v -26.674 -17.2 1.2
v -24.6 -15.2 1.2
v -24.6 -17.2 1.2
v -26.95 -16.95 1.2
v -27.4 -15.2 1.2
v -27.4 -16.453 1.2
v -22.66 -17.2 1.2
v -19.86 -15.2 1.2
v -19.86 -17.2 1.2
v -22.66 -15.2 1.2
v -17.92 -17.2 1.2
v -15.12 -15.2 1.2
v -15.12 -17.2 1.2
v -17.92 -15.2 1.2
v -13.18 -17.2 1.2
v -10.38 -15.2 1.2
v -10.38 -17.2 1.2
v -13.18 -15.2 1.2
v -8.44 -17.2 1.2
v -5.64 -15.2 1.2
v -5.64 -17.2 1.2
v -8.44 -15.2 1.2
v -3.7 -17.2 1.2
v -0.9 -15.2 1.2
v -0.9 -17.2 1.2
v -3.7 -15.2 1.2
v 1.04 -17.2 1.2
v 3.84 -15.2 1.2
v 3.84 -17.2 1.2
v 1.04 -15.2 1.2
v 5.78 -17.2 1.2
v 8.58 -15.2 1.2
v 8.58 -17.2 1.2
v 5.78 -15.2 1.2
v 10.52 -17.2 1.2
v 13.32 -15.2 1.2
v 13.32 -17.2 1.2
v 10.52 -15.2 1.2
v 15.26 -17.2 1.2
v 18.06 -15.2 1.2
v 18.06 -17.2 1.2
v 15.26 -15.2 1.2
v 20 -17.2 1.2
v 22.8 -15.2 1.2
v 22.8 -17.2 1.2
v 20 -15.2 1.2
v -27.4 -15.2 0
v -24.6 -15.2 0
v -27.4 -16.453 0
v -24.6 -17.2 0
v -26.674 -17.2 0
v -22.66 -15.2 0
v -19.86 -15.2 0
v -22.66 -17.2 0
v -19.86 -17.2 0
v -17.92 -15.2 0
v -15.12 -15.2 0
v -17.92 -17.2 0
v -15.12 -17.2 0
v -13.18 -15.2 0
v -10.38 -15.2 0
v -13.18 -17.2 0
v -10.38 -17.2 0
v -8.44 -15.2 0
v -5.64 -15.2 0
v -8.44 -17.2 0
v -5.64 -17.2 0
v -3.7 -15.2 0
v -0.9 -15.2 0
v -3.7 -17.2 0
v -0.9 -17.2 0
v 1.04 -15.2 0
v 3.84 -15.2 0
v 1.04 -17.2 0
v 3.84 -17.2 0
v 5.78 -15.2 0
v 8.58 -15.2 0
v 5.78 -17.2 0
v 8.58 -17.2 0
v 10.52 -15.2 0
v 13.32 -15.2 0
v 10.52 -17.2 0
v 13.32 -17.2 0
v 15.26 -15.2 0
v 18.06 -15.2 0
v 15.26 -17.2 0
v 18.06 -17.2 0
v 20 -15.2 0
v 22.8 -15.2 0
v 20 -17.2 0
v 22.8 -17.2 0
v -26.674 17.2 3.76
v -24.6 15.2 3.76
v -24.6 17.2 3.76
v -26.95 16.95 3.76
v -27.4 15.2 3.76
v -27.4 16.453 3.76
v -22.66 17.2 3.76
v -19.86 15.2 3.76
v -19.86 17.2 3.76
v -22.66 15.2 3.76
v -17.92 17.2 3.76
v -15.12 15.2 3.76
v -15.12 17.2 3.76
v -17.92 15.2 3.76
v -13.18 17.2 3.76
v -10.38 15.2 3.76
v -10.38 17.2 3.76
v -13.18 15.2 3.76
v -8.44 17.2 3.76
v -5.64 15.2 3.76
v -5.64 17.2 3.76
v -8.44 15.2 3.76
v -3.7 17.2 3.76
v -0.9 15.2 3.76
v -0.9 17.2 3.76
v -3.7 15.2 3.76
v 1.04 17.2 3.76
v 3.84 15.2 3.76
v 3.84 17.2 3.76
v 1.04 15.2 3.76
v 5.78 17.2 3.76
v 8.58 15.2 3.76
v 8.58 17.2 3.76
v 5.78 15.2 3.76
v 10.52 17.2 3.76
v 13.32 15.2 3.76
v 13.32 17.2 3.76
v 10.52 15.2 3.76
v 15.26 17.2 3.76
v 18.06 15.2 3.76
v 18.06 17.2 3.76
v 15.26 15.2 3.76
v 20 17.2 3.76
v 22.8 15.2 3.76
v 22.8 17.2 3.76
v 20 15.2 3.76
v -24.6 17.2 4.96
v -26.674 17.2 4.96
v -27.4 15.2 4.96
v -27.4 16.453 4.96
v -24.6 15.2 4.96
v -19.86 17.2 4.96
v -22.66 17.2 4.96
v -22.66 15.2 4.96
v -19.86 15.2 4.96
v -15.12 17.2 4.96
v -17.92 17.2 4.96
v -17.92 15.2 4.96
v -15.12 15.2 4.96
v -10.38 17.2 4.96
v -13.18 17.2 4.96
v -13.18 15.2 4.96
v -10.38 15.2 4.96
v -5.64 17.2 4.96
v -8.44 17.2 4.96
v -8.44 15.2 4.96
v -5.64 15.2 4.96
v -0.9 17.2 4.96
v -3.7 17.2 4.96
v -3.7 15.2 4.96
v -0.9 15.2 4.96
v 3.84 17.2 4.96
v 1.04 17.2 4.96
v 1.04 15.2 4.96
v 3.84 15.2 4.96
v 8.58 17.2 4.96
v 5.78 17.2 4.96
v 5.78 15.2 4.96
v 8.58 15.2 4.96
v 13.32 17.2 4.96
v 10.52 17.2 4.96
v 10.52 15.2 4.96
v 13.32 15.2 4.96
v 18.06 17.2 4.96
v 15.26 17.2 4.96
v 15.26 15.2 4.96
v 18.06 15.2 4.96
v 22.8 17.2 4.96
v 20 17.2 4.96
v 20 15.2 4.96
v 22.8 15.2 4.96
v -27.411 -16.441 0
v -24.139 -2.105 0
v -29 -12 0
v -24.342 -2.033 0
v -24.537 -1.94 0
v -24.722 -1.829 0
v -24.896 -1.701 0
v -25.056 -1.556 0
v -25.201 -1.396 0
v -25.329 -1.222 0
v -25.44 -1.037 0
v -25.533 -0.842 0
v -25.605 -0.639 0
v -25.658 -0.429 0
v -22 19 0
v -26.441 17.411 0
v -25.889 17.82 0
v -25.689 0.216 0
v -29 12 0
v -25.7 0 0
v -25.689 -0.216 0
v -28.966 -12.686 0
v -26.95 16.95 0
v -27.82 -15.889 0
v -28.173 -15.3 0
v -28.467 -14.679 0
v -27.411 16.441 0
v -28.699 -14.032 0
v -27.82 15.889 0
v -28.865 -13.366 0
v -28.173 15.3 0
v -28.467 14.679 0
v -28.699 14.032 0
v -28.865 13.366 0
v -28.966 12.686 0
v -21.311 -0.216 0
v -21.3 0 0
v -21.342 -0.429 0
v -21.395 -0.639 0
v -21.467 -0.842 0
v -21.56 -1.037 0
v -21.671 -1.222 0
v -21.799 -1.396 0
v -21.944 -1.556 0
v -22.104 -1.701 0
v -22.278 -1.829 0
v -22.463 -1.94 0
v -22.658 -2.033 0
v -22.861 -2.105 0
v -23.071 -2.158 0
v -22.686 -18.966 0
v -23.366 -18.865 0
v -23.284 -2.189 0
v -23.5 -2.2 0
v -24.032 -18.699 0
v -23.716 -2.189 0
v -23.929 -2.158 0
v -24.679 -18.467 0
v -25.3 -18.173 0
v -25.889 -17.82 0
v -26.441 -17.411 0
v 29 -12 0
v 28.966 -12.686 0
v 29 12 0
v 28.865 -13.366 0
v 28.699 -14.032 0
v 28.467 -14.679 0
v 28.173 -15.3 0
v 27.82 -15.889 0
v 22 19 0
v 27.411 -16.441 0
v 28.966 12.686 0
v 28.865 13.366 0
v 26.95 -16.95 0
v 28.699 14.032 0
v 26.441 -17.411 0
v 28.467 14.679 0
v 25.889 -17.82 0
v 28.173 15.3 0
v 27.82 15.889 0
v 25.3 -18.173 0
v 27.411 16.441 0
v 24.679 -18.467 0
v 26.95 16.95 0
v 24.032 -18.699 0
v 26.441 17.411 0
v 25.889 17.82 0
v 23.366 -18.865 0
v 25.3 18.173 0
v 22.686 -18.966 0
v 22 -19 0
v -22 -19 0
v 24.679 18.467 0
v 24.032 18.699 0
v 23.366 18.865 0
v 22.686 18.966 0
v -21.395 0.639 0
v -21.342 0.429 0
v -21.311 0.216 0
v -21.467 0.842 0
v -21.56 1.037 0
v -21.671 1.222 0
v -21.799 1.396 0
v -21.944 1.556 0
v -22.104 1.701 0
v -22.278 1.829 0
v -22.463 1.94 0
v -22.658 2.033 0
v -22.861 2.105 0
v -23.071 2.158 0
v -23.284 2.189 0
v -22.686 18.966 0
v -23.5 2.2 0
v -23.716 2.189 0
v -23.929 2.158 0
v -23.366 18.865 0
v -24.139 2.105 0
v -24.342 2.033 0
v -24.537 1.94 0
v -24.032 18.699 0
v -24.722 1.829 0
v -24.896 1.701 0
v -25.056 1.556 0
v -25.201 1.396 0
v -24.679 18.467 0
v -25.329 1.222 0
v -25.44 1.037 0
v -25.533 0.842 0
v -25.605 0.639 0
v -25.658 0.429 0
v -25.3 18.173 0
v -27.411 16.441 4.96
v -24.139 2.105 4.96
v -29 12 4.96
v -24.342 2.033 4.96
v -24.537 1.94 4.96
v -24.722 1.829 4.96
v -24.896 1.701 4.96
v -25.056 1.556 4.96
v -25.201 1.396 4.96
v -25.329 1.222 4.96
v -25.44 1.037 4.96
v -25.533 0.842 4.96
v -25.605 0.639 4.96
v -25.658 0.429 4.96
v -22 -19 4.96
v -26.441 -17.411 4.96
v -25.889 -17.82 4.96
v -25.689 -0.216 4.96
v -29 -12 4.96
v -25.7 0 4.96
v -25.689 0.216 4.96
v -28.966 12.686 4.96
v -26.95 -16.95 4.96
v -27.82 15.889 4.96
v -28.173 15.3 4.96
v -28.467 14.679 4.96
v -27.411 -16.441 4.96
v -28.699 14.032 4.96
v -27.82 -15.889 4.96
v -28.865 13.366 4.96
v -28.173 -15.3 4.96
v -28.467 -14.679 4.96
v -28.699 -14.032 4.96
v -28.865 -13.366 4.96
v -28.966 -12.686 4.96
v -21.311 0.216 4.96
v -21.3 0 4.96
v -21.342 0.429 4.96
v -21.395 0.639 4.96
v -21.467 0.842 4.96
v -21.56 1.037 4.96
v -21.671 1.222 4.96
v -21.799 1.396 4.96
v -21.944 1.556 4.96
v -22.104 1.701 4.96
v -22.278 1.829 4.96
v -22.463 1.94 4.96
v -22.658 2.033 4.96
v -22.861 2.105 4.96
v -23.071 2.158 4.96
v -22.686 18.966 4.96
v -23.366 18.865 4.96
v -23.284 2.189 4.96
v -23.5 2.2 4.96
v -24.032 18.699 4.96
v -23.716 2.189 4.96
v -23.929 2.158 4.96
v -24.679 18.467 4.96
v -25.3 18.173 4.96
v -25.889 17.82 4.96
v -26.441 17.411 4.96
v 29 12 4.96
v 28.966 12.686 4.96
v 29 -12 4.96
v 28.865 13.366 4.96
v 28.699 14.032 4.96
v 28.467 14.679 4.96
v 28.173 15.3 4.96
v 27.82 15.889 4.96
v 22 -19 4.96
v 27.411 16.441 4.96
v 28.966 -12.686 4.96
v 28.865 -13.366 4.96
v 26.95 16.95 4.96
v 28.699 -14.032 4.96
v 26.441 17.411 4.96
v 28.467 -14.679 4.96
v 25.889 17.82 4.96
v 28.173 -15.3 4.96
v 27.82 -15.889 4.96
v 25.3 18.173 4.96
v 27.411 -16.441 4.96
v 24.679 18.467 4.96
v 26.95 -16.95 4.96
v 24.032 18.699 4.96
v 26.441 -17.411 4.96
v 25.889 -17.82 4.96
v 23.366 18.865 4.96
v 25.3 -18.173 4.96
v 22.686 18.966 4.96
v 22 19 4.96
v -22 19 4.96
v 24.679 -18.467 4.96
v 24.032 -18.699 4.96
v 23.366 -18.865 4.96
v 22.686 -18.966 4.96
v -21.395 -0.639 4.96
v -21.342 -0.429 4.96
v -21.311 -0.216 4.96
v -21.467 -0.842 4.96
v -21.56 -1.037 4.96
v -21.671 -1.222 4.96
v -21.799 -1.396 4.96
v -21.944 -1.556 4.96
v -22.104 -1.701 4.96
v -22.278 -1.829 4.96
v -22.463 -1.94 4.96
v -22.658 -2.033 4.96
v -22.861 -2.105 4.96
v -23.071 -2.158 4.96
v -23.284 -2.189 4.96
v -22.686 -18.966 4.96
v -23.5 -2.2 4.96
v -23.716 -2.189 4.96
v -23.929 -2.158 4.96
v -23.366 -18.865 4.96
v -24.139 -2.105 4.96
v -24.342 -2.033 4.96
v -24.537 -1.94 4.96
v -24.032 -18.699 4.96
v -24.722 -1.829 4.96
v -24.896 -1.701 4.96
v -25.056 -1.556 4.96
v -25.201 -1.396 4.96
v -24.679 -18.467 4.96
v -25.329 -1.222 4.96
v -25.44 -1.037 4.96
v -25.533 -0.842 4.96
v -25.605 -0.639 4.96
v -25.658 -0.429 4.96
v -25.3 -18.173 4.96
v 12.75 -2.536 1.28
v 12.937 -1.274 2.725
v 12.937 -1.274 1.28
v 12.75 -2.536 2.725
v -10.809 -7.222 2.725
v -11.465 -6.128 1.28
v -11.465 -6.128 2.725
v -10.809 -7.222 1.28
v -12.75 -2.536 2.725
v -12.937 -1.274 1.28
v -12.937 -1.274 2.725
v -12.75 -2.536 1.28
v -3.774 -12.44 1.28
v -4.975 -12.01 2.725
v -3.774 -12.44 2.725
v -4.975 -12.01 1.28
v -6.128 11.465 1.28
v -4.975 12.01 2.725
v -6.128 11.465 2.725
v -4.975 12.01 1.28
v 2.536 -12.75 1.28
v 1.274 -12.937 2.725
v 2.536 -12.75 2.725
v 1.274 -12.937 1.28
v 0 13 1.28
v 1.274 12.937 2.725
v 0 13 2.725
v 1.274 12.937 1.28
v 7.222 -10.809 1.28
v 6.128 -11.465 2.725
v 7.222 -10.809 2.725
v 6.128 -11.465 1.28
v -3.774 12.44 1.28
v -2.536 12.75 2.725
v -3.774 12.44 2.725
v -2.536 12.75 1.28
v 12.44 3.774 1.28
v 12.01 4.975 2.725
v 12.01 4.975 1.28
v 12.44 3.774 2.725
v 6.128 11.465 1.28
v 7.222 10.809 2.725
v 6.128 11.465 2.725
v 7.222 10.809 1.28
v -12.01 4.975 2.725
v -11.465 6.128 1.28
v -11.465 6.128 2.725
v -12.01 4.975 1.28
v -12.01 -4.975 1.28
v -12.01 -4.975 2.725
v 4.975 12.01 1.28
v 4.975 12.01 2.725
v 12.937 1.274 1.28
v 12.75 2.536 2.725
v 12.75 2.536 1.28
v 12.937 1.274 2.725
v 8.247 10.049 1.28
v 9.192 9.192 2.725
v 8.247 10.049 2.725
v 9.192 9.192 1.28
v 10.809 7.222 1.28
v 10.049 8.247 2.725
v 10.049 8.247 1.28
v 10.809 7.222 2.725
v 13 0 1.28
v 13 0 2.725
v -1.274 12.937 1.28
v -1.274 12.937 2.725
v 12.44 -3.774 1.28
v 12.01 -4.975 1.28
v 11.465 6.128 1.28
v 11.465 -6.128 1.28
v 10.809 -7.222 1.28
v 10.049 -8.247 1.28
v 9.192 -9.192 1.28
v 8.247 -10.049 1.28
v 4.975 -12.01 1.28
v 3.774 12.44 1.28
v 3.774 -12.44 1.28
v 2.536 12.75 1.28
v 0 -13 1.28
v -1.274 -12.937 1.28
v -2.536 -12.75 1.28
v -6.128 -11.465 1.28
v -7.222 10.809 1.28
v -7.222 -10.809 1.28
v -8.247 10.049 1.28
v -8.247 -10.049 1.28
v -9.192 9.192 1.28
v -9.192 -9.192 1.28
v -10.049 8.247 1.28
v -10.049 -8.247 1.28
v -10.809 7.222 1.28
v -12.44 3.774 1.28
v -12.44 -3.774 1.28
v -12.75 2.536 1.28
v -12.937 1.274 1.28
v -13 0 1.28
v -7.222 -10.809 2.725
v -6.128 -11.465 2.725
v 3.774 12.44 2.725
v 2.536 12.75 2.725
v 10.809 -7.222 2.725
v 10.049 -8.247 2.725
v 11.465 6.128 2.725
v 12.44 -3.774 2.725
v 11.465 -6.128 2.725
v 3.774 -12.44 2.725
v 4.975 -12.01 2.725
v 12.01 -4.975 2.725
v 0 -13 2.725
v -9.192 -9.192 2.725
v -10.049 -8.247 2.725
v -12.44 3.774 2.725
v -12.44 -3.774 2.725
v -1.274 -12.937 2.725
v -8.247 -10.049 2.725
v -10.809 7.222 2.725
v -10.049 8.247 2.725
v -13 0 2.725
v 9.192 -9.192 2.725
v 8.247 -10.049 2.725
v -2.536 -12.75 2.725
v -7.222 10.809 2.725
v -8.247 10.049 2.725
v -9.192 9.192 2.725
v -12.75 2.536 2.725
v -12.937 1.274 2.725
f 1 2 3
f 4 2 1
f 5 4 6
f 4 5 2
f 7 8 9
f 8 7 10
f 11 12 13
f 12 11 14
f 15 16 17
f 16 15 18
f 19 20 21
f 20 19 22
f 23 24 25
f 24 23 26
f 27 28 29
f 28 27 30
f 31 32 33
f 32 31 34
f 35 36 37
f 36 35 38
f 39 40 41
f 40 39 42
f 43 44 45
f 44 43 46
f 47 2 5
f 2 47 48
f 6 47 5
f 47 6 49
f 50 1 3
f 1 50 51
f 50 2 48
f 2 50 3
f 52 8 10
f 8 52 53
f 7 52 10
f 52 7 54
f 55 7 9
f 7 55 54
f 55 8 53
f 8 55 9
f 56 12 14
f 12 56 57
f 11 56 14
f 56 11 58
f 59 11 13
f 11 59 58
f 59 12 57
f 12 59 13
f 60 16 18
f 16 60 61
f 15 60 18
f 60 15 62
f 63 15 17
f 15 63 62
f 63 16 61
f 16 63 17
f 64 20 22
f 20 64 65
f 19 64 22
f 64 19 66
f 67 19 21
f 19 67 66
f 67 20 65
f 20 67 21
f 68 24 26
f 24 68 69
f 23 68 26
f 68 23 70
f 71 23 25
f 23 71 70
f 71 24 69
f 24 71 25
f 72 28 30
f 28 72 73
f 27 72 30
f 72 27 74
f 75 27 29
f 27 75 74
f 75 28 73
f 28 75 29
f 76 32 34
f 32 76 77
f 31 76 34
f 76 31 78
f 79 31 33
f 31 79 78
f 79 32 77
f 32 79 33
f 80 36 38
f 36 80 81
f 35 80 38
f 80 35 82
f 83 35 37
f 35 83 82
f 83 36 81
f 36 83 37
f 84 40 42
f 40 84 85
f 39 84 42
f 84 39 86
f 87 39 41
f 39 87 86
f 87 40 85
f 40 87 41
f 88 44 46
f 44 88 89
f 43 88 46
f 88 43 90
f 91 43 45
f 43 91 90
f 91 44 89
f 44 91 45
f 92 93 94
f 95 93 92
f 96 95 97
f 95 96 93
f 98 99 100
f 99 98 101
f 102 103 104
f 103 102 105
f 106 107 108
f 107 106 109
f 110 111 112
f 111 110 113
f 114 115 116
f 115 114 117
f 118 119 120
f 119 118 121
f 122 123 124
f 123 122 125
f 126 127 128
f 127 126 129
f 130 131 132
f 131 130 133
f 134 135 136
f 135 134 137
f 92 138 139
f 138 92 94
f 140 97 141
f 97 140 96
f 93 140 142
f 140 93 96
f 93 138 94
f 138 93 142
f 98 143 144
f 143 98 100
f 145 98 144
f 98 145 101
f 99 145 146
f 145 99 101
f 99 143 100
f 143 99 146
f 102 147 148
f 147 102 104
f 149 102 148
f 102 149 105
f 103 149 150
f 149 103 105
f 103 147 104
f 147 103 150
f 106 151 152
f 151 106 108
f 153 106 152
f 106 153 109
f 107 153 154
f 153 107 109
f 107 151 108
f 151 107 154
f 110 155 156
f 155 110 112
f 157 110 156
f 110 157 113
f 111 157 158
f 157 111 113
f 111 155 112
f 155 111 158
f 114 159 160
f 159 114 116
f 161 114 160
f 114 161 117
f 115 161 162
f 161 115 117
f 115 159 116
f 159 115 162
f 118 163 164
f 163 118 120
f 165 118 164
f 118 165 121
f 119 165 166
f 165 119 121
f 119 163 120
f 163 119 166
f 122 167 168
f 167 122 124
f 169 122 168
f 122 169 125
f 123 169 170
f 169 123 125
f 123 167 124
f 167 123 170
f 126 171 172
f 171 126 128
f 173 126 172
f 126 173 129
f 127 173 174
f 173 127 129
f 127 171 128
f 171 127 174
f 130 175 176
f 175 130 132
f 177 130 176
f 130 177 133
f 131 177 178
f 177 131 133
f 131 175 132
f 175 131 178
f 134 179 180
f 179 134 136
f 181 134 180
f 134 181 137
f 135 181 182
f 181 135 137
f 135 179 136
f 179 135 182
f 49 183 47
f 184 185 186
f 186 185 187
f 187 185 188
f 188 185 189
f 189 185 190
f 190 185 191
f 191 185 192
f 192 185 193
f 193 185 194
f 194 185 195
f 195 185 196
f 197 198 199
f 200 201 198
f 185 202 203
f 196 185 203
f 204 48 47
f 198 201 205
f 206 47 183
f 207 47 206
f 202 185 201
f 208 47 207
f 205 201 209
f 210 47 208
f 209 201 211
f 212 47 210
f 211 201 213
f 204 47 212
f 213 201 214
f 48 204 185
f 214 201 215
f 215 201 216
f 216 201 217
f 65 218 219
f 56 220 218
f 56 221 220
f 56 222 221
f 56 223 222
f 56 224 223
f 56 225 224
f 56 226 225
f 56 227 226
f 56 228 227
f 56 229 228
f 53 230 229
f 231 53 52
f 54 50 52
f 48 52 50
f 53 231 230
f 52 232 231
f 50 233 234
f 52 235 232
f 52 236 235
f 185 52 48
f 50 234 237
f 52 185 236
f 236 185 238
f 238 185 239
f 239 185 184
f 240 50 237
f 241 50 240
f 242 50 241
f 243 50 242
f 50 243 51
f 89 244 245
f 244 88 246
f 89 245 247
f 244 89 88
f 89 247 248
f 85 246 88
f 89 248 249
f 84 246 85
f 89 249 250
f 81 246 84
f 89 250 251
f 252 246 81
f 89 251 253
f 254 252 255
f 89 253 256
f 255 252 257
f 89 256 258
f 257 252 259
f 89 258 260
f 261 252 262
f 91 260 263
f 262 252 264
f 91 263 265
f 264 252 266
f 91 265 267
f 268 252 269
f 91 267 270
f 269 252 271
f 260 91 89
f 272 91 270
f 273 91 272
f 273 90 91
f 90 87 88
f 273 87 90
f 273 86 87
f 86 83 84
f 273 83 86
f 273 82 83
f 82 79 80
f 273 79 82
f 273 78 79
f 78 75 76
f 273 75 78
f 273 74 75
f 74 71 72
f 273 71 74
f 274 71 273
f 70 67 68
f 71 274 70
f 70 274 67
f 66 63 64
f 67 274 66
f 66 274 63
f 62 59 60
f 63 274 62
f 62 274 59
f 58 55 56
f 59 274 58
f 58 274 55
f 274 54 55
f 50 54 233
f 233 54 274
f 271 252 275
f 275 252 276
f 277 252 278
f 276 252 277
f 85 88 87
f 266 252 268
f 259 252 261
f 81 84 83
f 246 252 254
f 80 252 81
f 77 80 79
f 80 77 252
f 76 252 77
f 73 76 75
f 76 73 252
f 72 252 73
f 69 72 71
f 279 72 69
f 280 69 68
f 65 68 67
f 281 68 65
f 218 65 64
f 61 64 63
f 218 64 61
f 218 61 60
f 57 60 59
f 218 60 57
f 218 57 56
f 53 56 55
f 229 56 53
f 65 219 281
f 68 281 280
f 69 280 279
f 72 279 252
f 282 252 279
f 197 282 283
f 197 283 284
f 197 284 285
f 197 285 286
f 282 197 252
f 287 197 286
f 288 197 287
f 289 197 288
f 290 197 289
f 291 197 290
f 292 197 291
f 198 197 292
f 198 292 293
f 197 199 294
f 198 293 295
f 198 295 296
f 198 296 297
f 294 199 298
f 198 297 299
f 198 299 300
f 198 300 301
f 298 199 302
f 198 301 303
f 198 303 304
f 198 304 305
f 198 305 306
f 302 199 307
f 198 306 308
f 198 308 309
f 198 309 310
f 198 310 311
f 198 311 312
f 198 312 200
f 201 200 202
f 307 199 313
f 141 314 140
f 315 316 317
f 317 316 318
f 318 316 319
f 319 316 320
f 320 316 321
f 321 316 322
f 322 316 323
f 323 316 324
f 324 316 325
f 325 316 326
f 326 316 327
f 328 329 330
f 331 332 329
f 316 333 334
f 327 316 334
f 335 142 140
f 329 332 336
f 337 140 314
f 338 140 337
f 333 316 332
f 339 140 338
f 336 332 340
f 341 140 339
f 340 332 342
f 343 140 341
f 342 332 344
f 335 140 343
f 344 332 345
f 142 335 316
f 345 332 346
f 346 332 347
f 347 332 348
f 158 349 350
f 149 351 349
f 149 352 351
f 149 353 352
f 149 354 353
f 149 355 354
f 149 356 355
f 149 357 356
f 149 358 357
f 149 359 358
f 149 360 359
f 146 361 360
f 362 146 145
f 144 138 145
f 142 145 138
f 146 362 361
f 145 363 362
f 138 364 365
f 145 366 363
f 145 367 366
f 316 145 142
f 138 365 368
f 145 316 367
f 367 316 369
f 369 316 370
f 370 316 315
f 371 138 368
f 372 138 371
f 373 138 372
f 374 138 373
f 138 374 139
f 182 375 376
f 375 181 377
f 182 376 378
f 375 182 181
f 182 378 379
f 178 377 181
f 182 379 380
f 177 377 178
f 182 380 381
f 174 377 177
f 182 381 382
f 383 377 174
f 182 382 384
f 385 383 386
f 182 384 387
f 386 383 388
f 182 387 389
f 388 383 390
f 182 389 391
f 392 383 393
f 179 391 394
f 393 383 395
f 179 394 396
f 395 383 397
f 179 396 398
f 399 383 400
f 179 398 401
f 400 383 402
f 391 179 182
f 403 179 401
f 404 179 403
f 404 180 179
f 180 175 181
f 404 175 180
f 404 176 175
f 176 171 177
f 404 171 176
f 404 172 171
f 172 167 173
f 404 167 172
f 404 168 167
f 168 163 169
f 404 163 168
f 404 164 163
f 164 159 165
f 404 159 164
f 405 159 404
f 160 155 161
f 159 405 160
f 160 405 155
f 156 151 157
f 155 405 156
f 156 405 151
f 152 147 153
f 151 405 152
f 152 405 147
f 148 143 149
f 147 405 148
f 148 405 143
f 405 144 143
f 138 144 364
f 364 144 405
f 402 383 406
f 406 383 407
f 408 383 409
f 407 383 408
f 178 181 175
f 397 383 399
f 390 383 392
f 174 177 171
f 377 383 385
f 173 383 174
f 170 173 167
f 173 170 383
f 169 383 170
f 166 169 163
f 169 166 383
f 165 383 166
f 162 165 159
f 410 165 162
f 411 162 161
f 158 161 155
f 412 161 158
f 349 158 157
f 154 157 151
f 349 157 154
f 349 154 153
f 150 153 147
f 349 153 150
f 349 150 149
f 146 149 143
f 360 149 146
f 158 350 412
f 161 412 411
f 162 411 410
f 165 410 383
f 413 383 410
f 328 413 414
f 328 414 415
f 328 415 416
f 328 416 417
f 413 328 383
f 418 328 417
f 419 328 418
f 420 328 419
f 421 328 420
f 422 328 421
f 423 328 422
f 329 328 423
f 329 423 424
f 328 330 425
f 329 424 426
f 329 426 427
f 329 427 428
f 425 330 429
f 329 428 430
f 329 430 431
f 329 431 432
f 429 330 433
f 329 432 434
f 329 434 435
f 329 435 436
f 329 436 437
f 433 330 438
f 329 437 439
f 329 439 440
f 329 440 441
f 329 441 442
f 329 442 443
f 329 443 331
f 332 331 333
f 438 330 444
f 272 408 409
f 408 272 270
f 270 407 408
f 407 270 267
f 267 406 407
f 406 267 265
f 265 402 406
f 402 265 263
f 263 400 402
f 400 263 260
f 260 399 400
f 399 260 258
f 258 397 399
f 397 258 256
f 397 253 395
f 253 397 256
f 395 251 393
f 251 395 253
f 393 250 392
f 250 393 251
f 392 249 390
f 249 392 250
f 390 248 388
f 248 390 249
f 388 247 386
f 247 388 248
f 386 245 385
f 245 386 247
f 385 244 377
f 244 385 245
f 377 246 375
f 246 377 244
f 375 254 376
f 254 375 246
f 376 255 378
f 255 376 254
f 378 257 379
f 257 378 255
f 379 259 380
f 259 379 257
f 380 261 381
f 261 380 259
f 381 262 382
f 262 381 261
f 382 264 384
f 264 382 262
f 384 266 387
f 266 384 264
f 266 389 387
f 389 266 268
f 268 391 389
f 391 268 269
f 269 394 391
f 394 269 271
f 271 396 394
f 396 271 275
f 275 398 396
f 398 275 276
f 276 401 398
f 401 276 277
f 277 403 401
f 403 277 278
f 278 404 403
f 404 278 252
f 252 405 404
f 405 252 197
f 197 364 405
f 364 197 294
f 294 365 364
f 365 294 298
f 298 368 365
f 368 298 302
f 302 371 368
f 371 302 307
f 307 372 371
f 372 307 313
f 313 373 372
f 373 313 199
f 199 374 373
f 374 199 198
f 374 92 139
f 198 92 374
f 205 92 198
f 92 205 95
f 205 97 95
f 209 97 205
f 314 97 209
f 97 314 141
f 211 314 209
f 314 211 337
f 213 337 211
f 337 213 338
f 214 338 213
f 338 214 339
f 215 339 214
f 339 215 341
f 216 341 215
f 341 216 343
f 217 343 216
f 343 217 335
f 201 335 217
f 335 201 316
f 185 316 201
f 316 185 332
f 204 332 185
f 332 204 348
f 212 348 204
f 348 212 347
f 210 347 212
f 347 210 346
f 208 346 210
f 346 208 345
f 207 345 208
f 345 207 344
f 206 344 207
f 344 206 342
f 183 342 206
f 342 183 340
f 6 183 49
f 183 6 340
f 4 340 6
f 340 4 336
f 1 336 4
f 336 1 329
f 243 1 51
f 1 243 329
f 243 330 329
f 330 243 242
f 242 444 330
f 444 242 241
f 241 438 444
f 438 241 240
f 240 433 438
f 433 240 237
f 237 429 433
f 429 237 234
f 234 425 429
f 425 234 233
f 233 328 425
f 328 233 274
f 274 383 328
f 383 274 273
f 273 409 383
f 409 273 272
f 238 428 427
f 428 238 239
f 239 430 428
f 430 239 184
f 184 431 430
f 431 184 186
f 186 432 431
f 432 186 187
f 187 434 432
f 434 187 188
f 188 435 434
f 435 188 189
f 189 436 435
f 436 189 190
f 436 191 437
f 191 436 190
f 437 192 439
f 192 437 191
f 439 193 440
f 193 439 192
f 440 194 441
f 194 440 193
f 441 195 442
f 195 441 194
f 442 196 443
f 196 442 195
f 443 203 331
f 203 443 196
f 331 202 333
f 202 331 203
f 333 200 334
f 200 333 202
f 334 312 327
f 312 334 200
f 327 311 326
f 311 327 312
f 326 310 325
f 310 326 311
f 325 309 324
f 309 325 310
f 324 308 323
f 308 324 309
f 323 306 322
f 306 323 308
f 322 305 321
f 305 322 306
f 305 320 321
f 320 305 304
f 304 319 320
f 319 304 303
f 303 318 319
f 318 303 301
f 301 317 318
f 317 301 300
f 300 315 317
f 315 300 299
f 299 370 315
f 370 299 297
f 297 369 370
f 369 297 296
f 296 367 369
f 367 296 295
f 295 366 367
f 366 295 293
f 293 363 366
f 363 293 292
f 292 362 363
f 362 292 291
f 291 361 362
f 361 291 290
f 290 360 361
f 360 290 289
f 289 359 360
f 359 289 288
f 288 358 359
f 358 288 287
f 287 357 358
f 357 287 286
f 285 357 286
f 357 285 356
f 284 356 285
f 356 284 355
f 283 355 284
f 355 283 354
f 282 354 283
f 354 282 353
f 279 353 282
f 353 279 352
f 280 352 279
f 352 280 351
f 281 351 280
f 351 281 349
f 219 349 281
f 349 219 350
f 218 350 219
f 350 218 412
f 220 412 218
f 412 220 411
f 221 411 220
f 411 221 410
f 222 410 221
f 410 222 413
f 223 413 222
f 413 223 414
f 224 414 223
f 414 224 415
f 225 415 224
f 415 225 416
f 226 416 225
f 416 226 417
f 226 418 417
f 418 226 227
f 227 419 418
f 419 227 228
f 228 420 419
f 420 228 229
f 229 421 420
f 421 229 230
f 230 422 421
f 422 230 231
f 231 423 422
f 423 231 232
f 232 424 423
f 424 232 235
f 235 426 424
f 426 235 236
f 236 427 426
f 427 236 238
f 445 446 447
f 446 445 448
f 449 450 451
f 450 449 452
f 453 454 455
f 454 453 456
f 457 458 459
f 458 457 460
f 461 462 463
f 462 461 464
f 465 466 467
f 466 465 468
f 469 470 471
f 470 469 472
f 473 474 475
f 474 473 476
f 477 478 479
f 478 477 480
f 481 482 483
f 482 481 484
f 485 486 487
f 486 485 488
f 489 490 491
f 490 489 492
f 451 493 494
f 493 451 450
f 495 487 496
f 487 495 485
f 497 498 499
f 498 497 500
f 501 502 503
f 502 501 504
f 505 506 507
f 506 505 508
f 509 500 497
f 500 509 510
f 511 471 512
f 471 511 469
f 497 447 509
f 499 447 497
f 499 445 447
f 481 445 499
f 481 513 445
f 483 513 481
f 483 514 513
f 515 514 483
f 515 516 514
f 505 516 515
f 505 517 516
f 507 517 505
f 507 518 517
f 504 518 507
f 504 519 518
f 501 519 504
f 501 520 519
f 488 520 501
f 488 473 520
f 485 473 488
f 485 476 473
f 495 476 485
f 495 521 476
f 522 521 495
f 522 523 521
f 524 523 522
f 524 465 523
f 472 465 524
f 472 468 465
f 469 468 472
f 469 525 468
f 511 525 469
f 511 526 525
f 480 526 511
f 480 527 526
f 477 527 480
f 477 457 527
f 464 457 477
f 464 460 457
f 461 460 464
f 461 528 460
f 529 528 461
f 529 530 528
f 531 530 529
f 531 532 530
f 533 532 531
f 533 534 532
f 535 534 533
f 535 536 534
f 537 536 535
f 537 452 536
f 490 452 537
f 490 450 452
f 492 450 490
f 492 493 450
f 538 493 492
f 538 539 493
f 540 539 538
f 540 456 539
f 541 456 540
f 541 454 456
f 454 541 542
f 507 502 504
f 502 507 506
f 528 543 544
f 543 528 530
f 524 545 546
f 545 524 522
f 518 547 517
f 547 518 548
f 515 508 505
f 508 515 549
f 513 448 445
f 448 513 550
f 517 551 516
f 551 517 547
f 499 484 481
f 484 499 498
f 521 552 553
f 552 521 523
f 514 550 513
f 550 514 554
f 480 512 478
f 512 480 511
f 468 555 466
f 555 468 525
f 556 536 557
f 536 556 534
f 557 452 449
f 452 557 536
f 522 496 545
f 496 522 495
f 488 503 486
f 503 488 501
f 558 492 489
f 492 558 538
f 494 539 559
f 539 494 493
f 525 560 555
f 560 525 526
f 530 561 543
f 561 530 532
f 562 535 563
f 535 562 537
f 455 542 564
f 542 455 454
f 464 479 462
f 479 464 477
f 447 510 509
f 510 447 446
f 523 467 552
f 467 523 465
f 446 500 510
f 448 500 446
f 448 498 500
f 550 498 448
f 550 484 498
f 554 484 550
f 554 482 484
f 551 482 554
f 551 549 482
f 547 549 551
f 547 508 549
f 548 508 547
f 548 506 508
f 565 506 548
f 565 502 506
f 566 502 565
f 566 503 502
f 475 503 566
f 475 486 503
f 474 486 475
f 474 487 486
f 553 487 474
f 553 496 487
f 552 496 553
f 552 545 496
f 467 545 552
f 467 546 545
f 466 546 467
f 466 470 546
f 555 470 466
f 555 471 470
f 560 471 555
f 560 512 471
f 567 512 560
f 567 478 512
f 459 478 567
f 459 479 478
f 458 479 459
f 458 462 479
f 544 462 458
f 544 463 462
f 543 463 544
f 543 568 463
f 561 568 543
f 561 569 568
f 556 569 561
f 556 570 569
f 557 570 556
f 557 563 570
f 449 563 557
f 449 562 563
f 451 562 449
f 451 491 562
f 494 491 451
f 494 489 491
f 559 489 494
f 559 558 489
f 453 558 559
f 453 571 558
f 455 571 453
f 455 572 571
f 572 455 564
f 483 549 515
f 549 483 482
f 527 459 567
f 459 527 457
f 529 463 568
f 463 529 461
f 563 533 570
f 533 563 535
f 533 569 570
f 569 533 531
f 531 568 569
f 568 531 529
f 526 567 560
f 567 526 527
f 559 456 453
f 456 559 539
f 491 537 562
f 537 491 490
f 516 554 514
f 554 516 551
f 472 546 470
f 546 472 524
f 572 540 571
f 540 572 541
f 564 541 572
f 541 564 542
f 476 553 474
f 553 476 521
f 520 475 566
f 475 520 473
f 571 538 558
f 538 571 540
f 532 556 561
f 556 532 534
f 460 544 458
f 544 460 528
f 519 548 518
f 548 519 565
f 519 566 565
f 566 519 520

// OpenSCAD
// ═══════════════════════════════════════════════════════════════
//  胶片相机 NFC 挂件 —— OpenSCAD 参数版
// ═══════════════════════════════════════════════════════════════
//  和 build_fob.py 是同一个模型，这个版本方便你：
//    · 改尺寸后立刻预览
//    · 用 text() 在正面压出相机名（Python 版做不到）
//    · 导出 STL 丢给切片器
//
//  打印要点：
//    0.16mm 层高，打印到 Z = 2.72mm（第 17 层）设暂停，
//    放入 25mm 圆片标签，继续打印封顶。
//    标签上方剩 2.24mm 塑料，NFC 穿透毫无压力。
// ═══════════════════════════════════════════════════════════════

LAYER      = 0.16;

// ── 外形 ──
W          = 58;      // 总宽
H          = 38;      // 总高
R          = 7;       // 圆角半径

// ── 厚度分层（用层数定义，保证暂停落在整层）──
BOT_LAYERS = 8;       // 底面实心层数
GAP_LAYERS = 9;       // 标签腔深度层数
TOP_LAYERS = 14;      // 封顶层数

// ── 标签腔 ──
TAG_D      = 26;      // 腔体直径（25mm 标签留单边 0.5mm 余量）

// ── 穿绳孔 ──
HOLE_D     = 4.4;
HOLE_INSET = 5.5;     // 孔心距左边缘

// ── 齿孔装饰（35mm 片框）──
PERF       = true;
PERF_W     = 2.8;
PERF_H     = 2.0;
PERF_PITCH = 4.74;    // 35mm 标准齿孔间距
PERF_DEPTH = 1.2;
PERF_INSET = 1.8;     // 齿孔外沿距上下边缘

// ── 正面浮雕文字（可选，留空则不打）──
NAME       = "";      // 例如 "M6"、"FM2"、"XA2"
NAME_SIZE  = 6;
NAME_DEPTH = 0.7;

$fn = 64;

// ── 派生尺寸 ──
Z_FLOOR = BOT_LAYERS * LAYER;
Z_PAUSE = Z_FLOOR + GAP_LAYERS * LAYER;
Z_TOTAL = Z_PAUSE + TOP_LAYERS * LAYER;

echo(str("总厚 ", Z_TOTAL, " mm"));
echo(str(">>> 在 Z = ", Z_PAUSE, " mm 暂停（第 ", BOT_LAYERS + GAP_LAYERS, " 层）"));

module rrect(w, h, r) {
    offset(r = r) square([w - 2*r, h - 2*r], center = true);
}

module perf_row(sign) {
    translate([0, sign * (H/2 - PERF_INSET - PERF_H/2)])
        for (x = [-W/2 + 3 : PERF_PITCH : W/2 - 3])
            translate([x, 0]) square([PERF_W, PERF_H], center = true);
}

module fob() {
    difference() {
        // 主体
        linear_extrude(Z_TOTAL)
            difference() {
                rrect(W, H, R);
                translate([-W/2 + HOLE_INSET, 0]) circle(d = HOLE_D);
            }

        // 标签腔（只挖到暂停高度，上方留封顶，不然标签会掉出来）
        translate([0, 0, Z_FLOOR])
            cylinder(d = TAG_D, h = Z_PAUSE - Z_FLOOR + 0.005);

        // 齿孔（上下各挖浅坑，不挖穿）
        if (PERF) {
            translate([0, 0, -0.5])
                linear_extrude(PERF_DEPTH + 0.5) perf_row(-1);
            translate([0, 0, Z_TOTAL - PERF_DEPTH])
                linear_extrude(PERF_DEPTH + 0.5) perf_row(1);
        }

        // 正面浮雕文字
        if (NAME != "")
            translate([0, 0, Z_TOTAL - NAME_DEPTH])
                linear_extrude(NAME_DEPTH + 0.5)
                    text(NAME, size = NAME_SIZE, halign = "center",
                         valign = "center", font = "Arial:style=Bold");
    }
}

fob();
